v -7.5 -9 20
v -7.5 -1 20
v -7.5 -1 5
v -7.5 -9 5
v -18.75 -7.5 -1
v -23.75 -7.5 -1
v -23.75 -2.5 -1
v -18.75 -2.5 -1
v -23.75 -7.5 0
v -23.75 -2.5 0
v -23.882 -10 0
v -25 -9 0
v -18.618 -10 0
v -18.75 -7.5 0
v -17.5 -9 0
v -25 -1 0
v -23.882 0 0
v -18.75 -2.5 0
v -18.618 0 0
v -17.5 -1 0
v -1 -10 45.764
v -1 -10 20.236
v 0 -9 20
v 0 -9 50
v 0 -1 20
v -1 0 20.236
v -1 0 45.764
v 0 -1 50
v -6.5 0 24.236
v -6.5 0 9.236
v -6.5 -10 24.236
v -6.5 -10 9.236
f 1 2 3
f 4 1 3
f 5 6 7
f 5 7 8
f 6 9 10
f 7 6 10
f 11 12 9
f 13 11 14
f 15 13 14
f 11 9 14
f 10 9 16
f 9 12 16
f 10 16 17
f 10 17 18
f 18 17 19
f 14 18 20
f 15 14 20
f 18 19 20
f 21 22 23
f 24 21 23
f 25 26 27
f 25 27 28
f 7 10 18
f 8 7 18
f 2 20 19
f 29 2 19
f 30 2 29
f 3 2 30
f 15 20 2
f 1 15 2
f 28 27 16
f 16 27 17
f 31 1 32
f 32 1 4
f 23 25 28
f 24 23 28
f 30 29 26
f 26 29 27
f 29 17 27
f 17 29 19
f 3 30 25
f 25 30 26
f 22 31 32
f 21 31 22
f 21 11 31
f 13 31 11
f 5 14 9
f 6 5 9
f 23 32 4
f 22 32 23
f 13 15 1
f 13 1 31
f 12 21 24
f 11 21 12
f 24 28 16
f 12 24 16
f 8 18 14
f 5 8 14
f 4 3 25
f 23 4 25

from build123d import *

# Parameters (mm, degrees)
F1_DEPTH = 10
F3_DEPTH = 1
F4_SIZE  = 1


with BuildPart() as f1:
    # F0 (on Front) → F1 (new body)
    with BuildSketch(Plane.XZ):
        Polygon((0, 20), (0, 50), (-25, 0), (-17.5, 0), (-7.5, 20), (-7.5, 5), align=None)
    extrude(amount=F1_DEPTH)

    # F2 (on face) → F3 (join)
    with BuildSketch(Plane(origin=(0, 0, 0), x_dir=(1, 0, 0), z_dir=(0, 0, -1))):
        Polygon((-21.25, 7.5), (-23.75, 7.5), (-23.75, 5), (-23.75, 2.5), (-21.25, 2.5), (-18.75, 2.5), (-18.75, 5), (-18.75, 7.5), align=None)
    extrude(amount=F3_DEPTH)

    # F4
    f4_edges = [f1.edges().sort_by_distance(p)[0] for p in [
        (-12.5, -10, 25),
        (0, -10, 35),
        (-12.5, 0, 25),
        (0, 0, 35),
        (-12.5, -10, 10),
        (-7.5, -10, 12.5),
        (-12.5, 0, 10),
        (-7.5, 0, 12.5),
        (-3.75, -10, 12.5),
        (-3.75, 0, 12.5),
    ]]
    chamfer(f4_edges, length=F4_SIZE)


solid = f1.part
